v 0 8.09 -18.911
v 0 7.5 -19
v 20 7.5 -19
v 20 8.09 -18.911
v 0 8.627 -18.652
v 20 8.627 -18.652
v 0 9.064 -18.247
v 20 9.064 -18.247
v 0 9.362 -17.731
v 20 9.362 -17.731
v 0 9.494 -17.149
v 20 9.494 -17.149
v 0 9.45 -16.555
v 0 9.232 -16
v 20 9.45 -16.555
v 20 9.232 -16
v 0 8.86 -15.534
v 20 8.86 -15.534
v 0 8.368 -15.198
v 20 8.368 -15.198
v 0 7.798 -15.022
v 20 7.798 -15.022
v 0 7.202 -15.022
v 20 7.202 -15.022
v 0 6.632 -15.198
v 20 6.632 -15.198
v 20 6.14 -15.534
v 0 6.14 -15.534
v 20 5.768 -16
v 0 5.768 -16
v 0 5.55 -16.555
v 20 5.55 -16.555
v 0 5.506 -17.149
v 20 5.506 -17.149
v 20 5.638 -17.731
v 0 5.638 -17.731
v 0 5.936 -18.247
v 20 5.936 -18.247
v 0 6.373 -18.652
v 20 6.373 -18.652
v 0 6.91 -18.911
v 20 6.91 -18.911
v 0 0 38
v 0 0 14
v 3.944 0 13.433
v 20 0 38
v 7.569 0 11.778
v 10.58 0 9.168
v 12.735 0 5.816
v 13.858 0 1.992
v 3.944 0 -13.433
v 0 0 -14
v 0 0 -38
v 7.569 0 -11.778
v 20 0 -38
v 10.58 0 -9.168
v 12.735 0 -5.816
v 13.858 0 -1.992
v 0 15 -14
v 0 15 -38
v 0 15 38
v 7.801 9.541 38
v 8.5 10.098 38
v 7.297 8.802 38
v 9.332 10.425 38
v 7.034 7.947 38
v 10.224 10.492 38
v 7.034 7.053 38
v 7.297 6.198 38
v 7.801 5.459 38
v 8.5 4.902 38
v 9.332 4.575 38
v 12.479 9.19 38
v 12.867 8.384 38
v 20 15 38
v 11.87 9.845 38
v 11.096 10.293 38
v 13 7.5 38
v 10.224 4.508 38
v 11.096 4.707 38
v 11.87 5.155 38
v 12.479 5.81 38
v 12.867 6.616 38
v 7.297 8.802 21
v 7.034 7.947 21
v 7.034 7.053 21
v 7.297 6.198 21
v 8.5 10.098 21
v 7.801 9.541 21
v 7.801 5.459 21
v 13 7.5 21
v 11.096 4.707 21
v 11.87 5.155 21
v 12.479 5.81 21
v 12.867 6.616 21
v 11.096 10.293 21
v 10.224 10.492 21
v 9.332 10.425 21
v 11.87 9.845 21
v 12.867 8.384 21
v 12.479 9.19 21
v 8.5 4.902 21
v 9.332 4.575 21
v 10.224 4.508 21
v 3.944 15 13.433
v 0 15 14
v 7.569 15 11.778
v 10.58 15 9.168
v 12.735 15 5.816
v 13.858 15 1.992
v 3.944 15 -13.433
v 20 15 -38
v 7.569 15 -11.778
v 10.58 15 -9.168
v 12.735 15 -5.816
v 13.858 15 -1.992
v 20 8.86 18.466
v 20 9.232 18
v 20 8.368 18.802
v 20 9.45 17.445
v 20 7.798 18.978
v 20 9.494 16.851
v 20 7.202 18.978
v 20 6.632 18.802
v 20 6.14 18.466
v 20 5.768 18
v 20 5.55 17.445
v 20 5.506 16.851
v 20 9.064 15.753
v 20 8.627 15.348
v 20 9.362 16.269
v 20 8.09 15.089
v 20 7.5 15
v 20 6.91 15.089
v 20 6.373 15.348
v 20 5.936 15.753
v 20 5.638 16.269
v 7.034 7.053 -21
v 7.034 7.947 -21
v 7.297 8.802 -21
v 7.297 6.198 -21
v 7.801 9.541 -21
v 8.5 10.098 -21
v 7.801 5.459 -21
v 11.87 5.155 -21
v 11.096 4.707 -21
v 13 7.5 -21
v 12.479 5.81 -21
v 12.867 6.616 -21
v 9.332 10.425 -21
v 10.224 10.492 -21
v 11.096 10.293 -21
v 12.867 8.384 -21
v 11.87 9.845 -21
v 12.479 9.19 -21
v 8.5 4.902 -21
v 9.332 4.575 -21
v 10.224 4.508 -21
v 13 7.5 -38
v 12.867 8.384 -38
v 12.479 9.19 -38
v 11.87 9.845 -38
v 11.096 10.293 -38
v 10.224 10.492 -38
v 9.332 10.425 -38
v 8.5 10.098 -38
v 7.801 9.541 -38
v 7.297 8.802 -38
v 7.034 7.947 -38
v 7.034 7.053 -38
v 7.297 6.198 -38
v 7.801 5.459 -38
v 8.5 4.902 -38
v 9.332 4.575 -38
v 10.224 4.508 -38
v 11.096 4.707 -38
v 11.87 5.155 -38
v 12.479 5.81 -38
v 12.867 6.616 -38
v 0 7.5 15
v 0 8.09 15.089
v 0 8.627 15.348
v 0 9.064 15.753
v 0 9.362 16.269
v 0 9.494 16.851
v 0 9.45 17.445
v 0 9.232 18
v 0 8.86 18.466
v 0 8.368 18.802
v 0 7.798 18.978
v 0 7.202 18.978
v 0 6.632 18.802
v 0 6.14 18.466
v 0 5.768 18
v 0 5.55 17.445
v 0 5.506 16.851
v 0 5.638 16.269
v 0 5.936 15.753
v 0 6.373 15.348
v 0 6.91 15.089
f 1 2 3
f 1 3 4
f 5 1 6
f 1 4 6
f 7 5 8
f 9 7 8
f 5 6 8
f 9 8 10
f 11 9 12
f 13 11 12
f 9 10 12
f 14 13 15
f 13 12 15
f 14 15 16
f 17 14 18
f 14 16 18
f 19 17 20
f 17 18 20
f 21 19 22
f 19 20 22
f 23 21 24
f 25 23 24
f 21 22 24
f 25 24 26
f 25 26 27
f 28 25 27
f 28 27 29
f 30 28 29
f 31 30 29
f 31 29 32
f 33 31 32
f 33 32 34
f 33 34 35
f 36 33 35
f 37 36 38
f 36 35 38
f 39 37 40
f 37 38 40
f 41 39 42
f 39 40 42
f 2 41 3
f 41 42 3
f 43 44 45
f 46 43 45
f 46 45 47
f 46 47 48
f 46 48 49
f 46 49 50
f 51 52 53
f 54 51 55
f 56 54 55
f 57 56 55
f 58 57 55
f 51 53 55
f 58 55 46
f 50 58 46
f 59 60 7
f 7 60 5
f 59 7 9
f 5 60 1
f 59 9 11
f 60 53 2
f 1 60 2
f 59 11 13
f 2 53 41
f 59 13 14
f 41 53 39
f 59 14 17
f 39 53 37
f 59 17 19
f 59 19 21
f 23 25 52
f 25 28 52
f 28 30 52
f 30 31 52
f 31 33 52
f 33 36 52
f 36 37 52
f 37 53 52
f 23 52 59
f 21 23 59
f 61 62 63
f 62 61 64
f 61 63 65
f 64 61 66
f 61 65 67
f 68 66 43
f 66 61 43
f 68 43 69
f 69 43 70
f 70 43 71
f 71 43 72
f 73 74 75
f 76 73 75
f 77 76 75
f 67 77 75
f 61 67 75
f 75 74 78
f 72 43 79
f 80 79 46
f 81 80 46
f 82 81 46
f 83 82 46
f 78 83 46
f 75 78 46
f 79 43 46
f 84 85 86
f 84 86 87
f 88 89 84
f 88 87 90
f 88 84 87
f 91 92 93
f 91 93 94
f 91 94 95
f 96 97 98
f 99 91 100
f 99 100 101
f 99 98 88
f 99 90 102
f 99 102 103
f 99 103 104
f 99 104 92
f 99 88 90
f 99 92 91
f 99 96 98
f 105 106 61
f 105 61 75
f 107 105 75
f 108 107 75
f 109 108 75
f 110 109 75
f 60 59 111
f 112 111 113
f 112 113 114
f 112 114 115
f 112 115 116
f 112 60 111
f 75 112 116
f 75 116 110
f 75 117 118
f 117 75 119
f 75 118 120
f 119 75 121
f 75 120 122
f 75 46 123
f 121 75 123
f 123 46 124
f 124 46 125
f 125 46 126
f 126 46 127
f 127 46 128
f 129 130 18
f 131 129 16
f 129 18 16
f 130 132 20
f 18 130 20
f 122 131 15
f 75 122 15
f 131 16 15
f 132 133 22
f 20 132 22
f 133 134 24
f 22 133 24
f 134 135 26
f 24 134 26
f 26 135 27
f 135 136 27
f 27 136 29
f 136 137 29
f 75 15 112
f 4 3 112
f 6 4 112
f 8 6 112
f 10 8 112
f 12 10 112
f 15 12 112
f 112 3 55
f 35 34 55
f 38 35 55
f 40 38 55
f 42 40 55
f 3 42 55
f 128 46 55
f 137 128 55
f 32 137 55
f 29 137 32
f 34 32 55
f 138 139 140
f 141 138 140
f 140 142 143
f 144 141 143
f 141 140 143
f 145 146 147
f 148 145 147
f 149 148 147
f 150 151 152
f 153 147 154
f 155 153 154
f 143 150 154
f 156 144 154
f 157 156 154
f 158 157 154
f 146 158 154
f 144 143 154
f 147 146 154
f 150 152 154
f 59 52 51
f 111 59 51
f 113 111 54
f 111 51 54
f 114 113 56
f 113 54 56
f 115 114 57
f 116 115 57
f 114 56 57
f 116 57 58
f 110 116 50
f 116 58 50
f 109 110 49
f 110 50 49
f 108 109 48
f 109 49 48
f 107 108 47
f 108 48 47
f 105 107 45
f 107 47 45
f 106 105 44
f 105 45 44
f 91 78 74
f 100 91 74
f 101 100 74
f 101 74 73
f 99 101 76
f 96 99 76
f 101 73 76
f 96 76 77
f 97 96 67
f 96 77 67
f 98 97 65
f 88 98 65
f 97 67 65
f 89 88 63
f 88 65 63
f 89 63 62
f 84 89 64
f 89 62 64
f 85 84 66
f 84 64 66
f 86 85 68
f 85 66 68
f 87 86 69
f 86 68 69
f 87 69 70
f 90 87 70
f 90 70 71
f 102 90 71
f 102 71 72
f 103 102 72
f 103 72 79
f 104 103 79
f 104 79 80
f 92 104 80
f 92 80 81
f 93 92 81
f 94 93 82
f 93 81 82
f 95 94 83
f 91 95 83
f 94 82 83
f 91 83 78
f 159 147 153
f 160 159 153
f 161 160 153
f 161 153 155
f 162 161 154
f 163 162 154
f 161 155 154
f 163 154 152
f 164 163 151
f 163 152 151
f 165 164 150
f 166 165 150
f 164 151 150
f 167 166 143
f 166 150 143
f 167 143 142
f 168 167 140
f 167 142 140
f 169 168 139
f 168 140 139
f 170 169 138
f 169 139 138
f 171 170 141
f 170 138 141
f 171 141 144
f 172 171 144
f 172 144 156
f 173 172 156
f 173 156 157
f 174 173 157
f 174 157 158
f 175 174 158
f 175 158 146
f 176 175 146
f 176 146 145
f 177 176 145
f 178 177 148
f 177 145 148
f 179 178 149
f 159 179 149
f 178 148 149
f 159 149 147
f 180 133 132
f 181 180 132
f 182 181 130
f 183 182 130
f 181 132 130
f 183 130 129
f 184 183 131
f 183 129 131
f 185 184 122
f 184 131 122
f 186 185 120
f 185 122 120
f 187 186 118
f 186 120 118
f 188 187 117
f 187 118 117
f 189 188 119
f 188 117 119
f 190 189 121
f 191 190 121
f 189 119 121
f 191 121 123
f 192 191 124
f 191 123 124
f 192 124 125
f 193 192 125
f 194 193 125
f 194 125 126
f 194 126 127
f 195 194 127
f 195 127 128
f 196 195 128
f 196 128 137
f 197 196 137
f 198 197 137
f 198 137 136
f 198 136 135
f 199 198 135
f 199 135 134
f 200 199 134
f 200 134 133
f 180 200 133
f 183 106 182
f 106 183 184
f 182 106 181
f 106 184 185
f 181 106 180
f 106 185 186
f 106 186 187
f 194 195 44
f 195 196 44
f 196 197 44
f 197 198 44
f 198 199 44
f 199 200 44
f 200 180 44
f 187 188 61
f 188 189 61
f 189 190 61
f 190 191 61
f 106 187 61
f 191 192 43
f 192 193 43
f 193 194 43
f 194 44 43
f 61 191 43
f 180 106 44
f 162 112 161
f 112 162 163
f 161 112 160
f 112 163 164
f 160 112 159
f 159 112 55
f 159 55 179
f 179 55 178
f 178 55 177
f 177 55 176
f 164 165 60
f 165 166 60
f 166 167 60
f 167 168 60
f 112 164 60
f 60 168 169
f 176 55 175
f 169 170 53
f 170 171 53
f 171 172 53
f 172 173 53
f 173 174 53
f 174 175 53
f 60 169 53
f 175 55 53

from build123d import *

# Parameters (mm, degrees)
EXTRUDE_1_DEPTH     = 15
SKETCH_3_R          = 2
CUT_EXTRUDE_3_DEPTH = 61
SKETCH_5_R          = 3
CUT_EXTRUDE_4_DEPTH = 17
CUT_EXTRUDE_START   = 17
SKETCH_6_R          = 3
CUT_EXTRUDE_5_DEPTH = 17


with BuildPart() as part:
    # Эскиз1 → Вытянуть1 (new body)
    with BuildSketch(Plane(origin=(0, 0, 0), x_dir=(1, 0, 0), z_dir=(0, 1, 0))):
        with BuildLine():
            Line((0, -14), (0, -38))
            Line((0, -38), (20.00009991, -38))
            Line((20.00009991, -38), (20.00009991, 38))
            Line((20.00009991, 38), (0, 38))
            Line((0, 38), (0, 14))
            ThreePointArc((0, 14), (14, 0), (0, -14))
        make_face()
    extrude(amount=EXTRUDE_1_DEPTH)

    # Эскиз3 → Вырез-Вытянуть3 (cut, symmetric)
    with BuildSketch(Plane(origin=(20.00009991, 0, 0), x_dir=(0, 0, -1), z_dir=(1, 0, 0))):
        with Locations((-17, 7.5)):
            Circle(SKETCH_3_R)
        with Locations((17, 7.5)):
            Circle(SKETCH_3_R)
    extrude(amount=CUT_EXTRUDE_3_DEPTH, both=True, mode=Mode.SUBTRACT)

    # Эскиз5 → Вырез-Вытянуть4 (cut)
    with BuildSketch(Plane.XY.offset(38)):
        with Locations((10, 7.5)):
            Circle(SKETCH_5_R)
    extrude(amount=-CUT_EXTRUDE_4_DEPTH, mode=Mode.SUBTRACT)

    # Эскиз6 → Вырез-Вытянуть5 (cut)
    with BuildSketch(Plane.XY.offset(-38).offset(CUT_EXTRUDE_START)):
        with Locations((10, 7.5)):
            Circle(SKETCH_6_R)
    extrude(amount=-CUT_EXTRUDE_5_DEPTH, mode=Mode.SUBTRACT)


solid = part.part
